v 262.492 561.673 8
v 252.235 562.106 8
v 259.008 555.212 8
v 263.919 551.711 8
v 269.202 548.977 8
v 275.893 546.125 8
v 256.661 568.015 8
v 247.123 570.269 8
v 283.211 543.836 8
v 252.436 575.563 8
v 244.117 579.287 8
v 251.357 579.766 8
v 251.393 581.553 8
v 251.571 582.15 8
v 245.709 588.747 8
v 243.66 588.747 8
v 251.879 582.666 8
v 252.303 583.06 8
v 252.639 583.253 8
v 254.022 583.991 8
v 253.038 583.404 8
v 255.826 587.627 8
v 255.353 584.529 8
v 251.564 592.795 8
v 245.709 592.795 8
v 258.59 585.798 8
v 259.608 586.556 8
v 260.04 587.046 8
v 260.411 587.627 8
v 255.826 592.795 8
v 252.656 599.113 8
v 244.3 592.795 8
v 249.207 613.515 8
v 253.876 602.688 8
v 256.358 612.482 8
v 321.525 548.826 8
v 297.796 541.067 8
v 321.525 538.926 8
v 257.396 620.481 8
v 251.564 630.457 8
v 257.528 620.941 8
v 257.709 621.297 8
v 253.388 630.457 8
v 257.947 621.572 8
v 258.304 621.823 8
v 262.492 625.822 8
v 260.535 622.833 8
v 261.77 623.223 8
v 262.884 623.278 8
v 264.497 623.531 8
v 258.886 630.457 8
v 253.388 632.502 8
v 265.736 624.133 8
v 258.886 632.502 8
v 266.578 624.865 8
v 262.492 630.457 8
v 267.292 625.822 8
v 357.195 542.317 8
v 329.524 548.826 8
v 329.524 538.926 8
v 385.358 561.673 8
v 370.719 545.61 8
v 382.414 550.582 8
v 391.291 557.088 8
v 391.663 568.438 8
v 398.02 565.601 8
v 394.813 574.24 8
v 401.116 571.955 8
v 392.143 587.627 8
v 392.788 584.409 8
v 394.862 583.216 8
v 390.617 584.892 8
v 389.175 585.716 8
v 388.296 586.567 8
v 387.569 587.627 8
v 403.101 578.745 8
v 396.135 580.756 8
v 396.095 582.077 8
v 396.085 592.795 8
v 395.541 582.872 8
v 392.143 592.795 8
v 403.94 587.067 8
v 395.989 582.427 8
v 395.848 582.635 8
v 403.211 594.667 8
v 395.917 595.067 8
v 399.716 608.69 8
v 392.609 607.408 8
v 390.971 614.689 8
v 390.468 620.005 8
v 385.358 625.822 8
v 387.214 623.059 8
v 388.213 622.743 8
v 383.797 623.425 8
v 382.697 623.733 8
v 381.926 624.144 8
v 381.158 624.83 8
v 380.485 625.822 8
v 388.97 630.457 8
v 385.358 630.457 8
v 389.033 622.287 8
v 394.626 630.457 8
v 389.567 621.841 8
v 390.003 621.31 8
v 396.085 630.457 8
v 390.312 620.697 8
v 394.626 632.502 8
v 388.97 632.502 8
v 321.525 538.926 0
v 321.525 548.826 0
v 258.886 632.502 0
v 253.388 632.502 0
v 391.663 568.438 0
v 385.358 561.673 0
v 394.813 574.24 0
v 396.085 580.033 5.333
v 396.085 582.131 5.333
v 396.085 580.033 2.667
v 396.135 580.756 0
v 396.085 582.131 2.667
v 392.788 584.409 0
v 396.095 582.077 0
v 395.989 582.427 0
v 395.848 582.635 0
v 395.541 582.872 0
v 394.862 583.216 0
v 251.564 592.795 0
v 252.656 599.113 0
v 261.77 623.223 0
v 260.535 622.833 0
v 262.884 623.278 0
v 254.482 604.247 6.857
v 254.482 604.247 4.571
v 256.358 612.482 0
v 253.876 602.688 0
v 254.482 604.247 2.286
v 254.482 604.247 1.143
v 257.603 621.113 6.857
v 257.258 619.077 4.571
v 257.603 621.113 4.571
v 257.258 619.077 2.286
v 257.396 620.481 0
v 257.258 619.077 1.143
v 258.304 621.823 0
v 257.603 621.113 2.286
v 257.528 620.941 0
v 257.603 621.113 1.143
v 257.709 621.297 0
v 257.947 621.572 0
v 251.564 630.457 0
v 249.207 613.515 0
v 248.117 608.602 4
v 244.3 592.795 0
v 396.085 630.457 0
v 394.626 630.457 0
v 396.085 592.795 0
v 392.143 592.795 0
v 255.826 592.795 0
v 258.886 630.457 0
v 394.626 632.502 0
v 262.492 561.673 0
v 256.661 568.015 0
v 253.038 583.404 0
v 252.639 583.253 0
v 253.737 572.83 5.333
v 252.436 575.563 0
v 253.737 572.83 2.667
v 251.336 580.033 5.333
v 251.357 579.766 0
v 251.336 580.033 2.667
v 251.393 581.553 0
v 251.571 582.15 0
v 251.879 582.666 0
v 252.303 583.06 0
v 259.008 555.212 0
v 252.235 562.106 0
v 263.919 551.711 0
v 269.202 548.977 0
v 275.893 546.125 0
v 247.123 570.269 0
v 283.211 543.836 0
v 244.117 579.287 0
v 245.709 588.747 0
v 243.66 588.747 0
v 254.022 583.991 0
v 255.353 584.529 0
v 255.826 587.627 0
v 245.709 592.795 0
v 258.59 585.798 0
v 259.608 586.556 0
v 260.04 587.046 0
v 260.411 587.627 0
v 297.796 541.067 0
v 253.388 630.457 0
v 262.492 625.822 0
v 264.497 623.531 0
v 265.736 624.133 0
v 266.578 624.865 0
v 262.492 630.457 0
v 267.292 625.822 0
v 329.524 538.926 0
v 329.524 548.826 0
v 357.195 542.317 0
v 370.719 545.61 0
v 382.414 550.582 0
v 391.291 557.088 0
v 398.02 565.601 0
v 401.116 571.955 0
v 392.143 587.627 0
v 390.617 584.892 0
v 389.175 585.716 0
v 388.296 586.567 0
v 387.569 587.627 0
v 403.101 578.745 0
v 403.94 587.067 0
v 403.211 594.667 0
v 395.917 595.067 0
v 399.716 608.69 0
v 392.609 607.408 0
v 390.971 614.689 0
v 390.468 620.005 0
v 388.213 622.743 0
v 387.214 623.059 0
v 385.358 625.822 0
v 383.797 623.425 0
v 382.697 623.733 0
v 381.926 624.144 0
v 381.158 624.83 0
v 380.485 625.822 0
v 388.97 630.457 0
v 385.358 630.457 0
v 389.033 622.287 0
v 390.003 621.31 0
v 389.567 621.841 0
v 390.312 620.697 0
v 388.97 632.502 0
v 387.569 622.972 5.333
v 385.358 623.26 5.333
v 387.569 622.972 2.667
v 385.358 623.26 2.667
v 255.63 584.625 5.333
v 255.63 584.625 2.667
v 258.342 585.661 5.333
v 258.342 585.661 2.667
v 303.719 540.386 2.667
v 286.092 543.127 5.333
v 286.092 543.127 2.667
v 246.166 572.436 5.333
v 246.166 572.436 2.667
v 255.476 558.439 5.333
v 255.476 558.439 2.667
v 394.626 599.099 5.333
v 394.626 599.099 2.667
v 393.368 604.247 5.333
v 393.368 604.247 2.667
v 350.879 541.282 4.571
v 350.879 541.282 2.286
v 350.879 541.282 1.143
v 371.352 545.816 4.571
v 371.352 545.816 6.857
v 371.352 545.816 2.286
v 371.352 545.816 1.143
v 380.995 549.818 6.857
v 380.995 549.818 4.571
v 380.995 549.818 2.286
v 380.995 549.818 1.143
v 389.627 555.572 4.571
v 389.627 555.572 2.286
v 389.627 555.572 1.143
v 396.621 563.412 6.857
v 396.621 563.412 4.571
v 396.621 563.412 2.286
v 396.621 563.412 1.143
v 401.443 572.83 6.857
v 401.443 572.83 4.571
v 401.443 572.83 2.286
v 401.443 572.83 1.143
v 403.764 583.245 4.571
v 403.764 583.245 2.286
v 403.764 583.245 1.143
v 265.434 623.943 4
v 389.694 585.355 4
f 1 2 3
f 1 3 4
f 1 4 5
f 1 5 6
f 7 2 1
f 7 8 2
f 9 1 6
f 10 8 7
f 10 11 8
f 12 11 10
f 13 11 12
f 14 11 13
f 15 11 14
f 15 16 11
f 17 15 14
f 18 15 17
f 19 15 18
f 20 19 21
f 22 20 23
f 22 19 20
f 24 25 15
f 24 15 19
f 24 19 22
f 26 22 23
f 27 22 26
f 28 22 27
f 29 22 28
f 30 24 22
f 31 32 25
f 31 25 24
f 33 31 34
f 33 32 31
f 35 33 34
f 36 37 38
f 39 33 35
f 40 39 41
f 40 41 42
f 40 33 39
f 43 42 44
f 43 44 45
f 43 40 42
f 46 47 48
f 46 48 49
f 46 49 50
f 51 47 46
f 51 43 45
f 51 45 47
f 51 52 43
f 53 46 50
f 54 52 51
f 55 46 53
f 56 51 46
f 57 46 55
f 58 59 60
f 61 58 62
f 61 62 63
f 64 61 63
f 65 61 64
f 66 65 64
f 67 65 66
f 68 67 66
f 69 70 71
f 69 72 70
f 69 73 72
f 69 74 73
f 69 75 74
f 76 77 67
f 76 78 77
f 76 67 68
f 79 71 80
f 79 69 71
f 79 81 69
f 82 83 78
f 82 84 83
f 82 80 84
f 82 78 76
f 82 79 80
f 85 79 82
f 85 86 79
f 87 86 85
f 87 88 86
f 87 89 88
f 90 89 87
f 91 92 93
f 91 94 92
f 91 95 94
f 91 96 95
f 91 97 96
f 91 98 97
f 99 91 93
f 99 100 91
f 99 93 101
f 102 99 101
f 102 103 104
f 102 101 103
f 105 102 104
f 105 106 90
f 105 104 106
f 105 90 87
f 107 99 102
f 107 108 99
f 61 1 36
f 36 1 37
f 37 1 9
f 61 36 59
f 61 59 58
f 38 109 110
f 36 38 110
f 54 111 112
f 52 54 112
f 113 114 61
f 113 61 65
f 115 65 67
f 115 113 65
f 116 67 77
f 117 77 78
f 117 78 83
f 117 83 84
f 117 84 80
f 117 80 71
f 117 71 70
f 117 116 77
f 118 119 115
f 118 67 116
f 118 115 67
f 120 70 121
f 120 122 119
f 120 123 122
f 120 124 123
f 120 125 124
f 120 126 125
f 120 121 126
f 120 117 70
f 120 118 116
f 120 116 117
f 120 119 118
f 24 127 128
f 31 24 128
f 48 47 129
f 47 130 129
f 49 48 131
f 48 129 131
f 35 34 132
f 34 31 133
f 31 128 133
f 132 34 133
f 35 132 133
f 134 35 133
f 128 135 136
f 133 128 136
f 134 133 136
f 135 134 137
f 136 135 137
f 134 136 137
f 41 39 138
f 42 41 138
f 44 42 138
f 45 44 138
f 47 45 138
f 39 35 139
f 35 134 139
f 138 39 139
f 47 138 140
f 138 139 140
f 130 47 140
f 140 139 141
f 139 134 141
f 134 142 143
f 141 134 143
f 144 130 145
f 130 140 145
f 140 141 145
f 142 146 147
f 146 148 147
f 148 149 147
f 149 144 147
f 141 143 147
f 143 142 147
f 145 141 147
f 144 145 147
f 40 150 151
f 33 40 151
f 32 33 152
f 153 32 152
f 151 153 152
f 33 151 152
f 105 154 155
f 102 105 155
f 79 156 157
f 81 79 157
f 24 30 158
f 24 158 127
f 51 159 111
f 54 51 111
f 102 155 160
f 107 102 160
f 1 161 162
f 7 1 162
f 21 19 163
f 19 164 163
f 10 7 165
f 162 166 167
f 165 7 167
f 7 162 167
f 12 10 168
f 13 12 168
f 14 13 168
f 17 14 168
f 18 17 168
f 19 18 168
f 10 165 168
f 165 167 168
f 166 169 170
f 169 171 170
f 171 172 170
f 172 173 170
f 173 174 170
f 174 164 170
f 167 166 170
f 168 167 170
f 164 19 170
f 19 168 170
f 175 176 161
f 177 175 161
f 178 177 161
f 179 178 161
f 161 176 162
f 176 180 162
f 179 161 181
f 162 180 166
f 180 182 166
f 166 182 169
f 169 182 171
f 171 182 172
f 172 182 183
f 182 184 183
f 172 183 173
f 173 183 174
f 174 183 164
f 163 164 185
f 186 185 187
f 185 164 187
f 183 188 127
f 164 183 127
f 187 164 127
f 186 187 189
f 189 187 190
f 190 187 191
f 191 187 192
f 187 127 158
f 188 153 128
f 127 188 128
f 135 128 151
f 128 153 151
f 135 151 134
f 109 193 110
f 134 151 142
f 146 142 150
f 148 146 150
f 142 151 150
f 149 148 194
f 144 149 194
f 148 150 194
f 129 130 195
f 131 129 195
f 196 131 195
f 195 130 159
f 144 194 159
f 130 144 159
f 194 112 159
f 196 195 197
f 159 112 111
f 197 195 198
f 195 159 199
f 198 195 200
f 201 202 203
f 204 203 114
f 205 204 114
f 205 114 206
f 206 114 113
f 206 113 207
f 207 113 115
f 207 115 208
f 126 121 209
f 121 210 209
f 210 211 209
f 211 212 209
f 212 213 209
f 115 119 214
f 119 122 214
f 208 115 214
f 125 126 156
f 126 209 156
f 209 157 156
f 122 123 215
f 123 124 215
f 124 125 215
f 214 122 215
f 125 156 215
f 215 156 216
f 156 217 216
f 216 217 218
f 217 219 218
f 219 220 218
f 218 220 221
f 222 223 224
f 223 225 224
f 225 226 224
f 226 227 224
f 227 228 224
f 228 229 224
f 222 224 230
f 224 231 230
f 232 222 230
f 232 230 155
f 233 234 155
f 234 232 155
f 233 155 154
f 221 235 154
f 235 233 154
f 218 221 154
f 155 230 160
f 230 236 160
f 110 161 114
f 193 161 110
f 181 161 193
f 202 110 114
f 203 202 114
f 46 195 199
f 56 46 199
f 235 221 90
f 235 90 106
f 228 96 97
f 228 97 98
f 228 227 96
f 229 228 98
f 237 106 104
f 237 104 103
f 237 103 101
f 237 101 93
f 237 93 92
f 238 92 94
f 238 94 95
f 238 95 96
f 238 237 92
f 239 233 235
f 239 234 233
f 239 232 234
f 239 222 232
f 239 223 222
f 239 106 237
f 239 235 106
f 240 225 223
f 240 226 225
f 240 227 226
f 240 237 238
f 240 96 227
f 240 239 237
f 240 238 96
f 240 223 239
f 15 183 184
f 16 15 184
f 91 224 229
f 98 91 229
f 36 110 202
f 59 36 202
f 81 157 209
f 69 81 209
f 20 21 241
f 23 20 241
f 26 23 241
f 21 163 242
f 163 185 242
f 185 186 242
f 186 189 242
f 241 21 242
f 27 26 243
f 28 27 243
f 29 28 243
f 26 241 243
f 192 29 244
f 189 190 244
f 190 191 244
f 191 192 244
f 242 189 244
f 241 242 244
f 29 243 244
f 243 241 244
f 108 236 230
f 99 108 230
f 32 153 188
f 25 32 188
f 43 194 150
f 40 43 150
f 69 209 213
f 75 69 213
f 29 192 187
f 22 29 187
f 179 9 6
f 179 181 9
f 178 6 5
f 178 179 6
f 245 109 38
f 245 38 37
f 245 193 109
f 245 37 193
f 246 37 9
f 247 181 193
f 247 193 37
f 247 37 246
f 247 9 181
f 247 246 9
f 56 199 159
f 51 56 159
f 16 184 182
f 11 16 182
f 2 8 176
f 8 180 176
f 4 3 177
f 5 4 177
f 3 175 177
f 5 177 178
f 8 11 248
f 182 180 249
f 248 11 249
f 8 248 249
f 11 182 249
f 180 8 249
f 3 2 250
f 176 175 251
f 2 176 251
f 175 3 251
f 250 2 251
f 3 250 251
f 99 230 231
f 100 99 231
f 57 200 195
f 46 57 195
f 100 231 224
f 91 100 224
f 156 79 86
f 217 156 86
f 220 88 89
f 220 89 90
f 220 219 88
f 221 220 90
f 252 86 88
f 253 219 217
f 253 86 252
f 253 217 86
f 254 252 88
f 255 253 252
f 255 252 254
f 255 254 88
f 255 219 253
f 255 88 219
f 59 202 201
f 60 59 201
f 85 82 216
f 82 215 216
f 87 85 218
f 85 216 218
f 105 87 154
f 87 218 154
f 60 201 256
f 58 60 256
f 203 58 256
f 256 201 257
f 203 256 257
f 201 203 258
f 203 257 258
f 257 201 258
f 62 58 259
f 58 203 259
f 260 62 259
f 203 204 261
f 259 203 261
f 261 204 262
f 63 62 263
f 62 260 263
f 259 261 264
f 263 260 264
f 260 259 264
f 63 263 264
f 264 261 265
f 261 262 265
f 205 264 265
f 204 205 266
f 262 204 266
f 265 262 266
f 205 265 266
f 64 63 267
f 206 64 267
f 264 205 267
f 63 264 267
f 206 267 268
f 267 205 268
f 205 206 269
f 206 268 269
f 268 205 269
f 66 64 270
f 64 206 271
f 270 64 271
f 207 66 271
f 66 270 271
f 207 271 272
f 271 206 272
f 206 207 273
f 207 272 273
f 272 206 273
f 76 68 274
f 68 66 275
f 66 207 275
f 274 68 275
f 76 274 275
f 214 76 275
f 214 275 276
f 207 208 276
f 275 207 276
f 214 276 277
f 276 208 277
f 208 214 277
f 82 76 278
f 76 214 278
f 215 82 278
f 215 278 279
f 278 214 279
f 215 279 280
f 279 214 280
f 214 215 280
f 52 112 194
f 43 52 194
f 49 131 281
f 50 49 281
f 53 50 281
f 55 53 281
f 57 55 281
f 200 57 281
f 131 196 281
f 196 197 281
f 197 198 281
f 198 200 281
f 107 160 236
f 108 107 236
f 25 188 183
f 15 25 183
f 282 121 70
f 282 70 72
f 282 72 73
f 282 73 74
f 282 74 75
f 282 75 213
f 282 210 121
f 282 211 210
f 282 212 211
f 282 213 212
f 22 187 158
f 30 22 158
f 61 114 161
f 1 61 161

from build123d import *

# Parameters (mm, degrees)
EXTRUDE_1_DEPTH = 8


with BuildPart() as part:
    # 草图1 → 凸台-拉伸1 (new body)
    with BuildSketch(Plane.XY):
        with BuildLine():
            Line((385.357965433, 561.673346746), (262.492458261, 561.673346746))
            add(Edge.make_bspline(
                [(262.492458261, 561.673346746), (258.755227054, 564.690747097), (254.489163017, 570.692581983), (250.958558339, 578.663699118), (251.392954201, 582.911995995), (253.038032269, 583.404225799)],
                knots=[0, 0, 0, 0, 0.550288843, 0.843333433, 1, 1, 1, 1], degree=3))
            add(Edge.make_bspline(
                [(253.038032269, 583.404225799), (255.315281718, 585.087405675), (258.917465666, 584.826242923), (260.41054922, 587.626667325)],
                knots=[0, 0, 0, 0, 1, 1, 1, 1], degree=3))
            Line((260.41054922, 587.626667325), (255.826100279, 587.626667325))
            Line((255.826100279, 587.626667325), (255.826100279, 592.795047007))
            Line((255.826100279, 592.795047007), (251.563528879, 592.795047007))
            add(Edge.make_bspline(
                [(251.563528879, 592.795047007), (252.099280578, 595.332356389), (252.30424139, 599.397528909), (254.870367315, 604.704853199), (256.036177185, 611.101930065), (257.223774455, 616.403011152), (257.350806226, 621.517018547), (260.018224217, 622.50942986), (261.44273548, 623.403583051), (262.884397407, 623.277955683)],
                knots=[0, 0, 0, 0, 0.225136841, 0.340464557, 0.504459531, 0.773880132, 0.846142279, 0.887847448, 1, 1, 1, 1], degree=3))
            add(Edge.make_bspline(
                [(262.884397407, 623.277955683), (265.779471506, 623.335229178), (267.291857283, 625.822468601)],
                knots=[0, 0, 0, 1, 1, 1], degree=2))
            Line((267.291857283, 625.822468601), (262.492458261, 625.822468601))
            Line((262.492458261, 625.822468601), (262.492458261, 630.45711713))
            Line((262.492458261, 630.45711713), (258.885877108, 630.45711713))
            Line((258.885877108, 630.45711713), (258.885877108, 632.501815011))
            Line((258.885877108, 632.501815011), (253.387911696, 632.501815011))
            Line((253.387911696, 632.501815011), (253.387911696, 630.45711713))
            Line((253.387911696, 630.45711713), (251.563528879, 630.45711713))
            add(Edge.make_bspline(
                [(251.563528879, 630.45711713), (250.698671259, 623.153297386), (249.372551029, 610.306461705), (244.876032821, 598.230117075), (244.30036556, 592.795047007)],
                knots=[0, 0, 0, 0, 0.576314622, 1, 1, 1, 1], degree=3))
            Line((244.30036556, 592.795047007), (245.708935211, 592.795047007))
            Line((245.708935211, 592.795047007), (245.708935211, 588.747012602))
            Line((245.708935211, 588.747012602), (243.659941785, 588.747012602))
            add(Edge.make_bspline(
                [(243.659941785, 588.747012602), (241.968151152, 572.019946819), (254.064905505, 555.430773354), (269.202063097, 548.976807751)],
                knots=[0, 0, 0, 0, 1, 1, 1, 1], degree=3))
            add(Edge.make_bspline(
                [(321.524786635, 538.925598683), (303.815006214, 540.356414038), (285.537738305, 540.961956127), (269.202063097, 548.976807751)],
                knots=[0, 0, 0, 0, 1, 1, 1, 1], degree=3))
            Line((321.524786635, 538.925598683), (321.524786635, 548.825598683))
            Line((321.524786635, 548.825598683), (329.523681786, 548.825598683))
            Line((329.523681786, 548.825598683), (329.523681786, 538.925598683))
            add(Edge.make_bspline(
                [(329.523681786, 538.925598683), (336.635065679, 539.455855838), (350.795036594, 540.98434062), (371.450253512, 544.894314569), (390.860581729, 554.149899578), (403.17715419, 572.252526901), (404.919659425, 590.639617898), (398.920276591, 609.258314447), (397.578120519, 621.728272643), (396.084660892, 630.45711713)],
                knots=[0.022562909, 0.022562909, 0.022562909, 0.022562909, 0.169619713, 0.313456669, 0.455553847, 0.599027509, 0.743616146, 0.81734271, 1, 1, 1, 1], degree=3))
            Line((396.084660892, 630.45711713), (394.626288649, 630.45711713))
            Line((394.626288649, 630.45711713), (394.626288649, 632.501815011))
            Line((394.626288649, 632.501815011), (388.969627714, 632.501815011))
            Line((388.969627714, 632.501815011), (388.969627714, 630.45711713))
            Line((388.969627714, 630.45711713), (385.357965433, 630.45711713))
            Line((385.357965433, 630.45711713), (385.357965433, 625.822468601))
            Line((385.357965433, 625.822468601), (380.484636312, 625.822468601))
            add(Edge.make_bspline(
                [(390.468186764, 620.004547134), (390.318441736, 621.540164676), (388.291406594, 623.105959301), (384.266764698, 623.301339884), (381.681013657, 623.566294511), (380.484636312, 625.822468601)],
                knots=[0, 0, 0, 0, 0.359484701, 0.544095806, 1, 1, 1, 1], degree=3))
            add(Edge.make_bspline(
                [(396.084660892, 592.795047007), (396.273338821, 595.035601852), (394.491326644, 598.649653656), (392.754617954, 607.78086099), (390.506088052, 614.555885201), (390.468186764, 620.004547134)],
                knots=[0, 0, 0, 0, 0.233822493, 0.424152047, 1, 1, 1, 1], degree=3))
            Line((396.084660892, 592.795047007), (392.143349898, 592.795047007))
            Line((392.143349898, 592.795047007), (392.143349898, 587.626667325))
            Line((392.143349898, 587.626667325), (387.568865956, 587.626667325))
            add(Edge.make_bspline(
                [(392.787643411, 584.409050029), (389.209022339, 584.691860965), (387.568865956, 587.626667325)],
                knots=[0, 0, 0, 1, 1, 1], degree=2))
            add(Edge.make_bspline(
                [(385.357965433, 561.673346746), (390.860473795, 566.695743735), (395.811948725, 572.387483653), (396.250899198, 583.226521225), (395.181143378, 582.798789337), (392.787643411, 584.409050029)],
                knots=[0, 0, 0, 0, 0.778226287, 0.85369222, 1, 1, 1, 1], degree=3))
        make_face()
    extrude(amount=EXTRUDE_1_DEPTH)


solid = part.part
